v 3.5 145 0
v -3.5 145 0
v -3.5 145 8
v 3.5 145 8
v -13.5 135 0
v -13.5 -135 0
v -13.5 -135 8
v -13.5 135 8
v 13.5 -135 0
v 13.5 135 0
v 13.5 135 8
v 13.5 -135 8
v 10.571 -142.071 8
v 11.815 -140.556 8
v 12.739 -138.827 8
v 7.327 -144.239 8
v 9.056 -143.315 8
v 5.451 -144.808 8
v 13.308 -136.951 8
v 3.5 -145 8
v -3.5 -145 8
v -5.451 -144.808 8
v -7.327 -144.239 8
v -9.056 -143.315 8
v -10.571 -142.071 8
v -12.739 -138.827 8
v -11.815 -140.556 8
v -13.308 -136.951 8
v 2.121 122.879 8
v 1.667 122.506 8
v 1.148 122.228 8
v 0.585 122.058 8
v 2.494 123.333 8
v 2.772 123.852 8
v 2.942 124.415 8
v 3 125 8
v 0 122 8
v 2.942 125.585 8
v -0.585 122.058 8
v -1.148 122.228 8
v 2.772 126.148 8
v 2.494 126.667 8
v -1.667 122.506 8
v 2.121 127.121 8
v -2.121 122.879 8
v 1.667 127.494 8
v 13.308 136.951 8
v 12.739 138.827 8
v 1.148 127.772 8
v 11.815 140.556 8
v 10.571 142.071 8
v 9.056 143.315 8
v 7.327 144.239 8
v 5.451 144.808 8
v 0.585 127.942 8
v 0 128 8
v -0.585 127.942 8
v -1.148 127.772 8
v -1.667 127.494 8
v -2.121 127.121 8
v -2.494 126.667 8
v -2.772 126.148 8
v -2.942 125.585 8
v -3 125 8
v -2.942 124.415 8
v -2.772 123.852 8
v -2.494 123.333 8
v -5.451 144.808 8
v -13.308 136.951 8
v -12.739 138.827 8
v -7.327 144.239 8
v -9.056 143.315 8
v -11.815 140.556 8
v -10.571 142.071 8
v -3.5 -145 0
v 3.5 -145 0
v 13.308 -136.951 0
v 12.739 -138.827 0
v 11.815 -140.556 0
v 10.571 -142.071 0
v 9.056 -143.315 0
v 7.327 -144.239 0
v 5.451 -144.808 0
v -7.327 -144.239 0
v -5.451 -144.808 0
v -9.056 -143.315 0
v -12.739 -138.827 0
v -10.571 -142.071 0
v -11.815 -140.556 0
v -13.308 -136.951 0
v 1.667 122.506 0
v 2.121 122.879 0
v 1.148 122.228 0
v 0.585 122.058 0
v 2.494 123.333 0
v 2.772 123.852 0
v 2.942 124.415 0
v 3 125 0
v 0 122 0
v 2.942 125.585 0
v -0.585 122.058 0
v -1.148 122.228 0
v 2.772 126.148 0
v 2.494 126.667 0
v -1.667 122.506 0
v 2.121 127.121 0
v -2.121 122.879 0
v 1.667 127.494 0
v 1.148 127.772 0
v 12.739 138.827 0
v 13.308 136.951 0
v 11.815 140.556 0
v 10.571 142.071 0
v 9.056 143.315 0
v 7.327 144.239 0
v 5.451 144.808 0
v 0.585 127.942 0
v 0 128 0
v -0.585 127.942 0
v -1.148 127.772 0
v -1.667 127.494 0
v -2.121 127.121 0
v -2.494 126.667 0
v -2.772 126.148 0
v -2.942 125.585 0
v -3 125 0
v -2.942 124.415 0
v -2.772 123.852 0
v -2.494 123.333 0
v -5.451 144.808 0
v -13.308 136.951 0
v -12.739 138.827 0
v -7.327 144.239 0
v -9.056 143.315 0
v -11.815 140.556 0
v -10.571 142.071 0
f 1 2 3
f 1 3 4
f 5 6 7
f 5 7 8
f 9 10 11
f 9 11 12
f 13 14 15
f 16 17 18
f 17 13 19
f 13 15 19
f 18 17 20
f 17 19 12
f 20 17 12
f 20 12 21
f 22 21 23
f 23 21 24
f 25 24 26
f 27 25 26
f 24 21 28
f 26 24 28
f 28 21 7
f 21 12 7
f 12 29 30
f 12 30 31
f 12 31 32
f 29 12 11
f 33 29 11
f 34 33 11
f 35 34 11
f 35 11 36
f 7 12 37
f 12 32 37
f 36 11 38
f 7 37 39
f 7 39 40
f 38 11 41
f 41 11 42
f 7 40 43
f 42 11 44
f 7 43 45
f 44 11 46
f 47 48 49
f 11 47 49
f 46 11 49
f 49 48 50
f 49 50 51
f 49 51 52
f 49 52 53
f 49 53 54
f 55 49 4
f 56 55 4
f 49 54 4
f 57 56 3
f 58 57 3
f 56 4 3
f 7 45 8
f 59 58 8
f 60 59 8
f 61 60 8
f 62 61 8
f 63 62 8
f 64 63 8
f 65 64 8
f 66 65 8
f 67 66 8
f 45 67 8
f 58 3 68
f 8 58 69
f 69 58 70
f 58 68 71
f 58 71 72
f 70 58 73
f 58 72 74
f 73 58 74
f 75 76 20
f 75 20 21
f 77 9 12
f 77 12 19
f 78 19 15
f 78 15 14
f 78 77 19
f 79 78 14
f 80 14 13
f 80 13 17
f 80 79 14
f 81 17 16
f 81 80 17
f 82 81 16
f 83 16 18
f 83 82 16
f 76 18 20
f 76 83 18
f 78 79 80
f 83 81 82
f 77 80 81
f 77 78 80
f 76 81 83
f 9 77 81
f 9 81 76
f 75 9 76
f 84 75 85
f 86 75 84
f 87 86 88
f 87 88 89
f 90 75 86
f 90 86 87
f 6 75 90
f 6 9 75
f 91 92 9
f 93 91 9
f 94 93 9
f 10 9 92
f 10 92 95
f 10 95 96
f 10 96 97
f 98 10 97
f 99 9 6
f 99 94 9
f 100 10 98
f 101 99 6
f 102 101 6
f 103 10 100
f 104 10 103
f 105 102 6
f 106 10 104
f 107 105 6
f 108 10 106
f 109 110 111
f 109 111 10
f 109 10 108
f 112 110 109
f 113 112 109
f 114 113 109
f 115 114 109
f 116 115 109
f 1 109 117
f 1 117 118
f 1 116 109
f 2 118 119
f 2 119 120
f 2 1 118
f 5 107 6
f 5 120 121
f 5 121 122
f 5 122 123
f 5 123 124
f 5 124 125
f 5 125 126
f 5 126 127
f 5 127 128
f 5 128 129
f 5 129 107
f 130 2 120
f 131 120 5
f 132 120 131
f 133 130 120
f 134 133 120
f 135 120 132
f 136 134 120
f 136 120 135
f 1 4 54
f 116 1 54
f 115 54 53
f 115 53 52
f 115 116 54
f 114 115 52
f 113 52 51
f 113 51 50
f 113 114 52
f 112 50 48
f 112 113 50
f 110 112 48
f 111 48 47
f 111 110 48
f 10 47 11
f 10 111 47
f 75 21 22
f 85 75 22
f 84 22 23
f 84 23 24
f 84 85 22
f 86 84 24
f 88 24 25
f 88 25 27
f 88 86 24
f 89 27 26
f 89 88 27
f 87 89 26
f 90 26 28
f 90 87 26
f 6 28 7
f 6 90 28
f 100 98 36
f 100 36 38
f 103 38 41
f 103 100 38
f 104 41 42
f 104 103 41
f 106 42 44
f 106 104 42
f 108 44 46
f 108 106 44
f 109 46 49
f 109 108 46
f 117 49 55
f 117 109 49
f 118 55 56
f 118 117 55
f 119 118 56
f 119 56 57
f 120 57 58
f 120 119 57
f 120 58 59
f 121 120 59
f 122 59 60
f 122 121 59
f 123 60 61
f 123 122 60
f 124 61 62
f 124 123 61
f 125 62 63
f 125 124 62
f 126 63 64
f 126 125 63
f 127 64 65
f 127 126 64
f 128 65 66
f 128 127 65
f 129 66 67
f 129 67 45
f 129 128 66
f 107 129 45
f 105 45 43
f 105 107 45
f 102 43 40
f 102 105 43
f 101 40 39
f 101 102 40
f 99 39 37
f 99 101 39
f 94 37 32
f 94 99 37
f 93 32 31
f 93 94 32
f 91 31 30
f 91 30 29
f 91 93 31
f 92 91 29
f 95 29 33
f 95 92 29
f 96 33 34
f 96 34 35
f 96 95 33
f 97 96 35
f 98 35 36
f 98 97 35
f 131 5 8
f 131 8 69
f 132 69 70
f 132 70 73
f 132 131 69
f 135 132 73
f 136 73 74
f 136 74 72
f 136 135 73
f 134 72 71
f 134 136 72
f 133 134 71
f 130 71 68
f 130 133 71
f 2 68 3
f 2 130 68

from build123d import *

# Parameters (mm, degrees)
SKETCH1_R           = 3
BOSS_EXTRUDE1_DEPTH = 8


with BuildPart() as part:
    # Sketch1 → Boss-Extrude1 (new body)
    with BuildSketch(Plane.XY):
        with BuildLine():
            ThreePointArc((3.5, 145), (10.571067812, 142.071067812), (13.5, 135))
            Line((13.5, 135), (13.5, -135))
            ThreePointArc((13.5, -135), (10.571067812, -142.071067812), (3.5, -145))
            Line((3.5, -145), (-3.5, -145))
            ThreePointArc((-3.5, -145), (-10.571067812, -142.071067812), (-13.5, -135))
            Line((-13.5, -135), (-13.5, 135))
            ThreePointArc((-13.5, 135), (-10.571067812, 142.071067812), (-3.5, 145))
            Line((-3.5, 145), (3.5, 145))
        make_face()
        with Locations((0, 125)):
            Circle(SKETCH1_R, mode=Mode.SUBTRACT)
    extrude(amount=BOSS_EXTRUDE1_DEPTH)


solid = part.part
